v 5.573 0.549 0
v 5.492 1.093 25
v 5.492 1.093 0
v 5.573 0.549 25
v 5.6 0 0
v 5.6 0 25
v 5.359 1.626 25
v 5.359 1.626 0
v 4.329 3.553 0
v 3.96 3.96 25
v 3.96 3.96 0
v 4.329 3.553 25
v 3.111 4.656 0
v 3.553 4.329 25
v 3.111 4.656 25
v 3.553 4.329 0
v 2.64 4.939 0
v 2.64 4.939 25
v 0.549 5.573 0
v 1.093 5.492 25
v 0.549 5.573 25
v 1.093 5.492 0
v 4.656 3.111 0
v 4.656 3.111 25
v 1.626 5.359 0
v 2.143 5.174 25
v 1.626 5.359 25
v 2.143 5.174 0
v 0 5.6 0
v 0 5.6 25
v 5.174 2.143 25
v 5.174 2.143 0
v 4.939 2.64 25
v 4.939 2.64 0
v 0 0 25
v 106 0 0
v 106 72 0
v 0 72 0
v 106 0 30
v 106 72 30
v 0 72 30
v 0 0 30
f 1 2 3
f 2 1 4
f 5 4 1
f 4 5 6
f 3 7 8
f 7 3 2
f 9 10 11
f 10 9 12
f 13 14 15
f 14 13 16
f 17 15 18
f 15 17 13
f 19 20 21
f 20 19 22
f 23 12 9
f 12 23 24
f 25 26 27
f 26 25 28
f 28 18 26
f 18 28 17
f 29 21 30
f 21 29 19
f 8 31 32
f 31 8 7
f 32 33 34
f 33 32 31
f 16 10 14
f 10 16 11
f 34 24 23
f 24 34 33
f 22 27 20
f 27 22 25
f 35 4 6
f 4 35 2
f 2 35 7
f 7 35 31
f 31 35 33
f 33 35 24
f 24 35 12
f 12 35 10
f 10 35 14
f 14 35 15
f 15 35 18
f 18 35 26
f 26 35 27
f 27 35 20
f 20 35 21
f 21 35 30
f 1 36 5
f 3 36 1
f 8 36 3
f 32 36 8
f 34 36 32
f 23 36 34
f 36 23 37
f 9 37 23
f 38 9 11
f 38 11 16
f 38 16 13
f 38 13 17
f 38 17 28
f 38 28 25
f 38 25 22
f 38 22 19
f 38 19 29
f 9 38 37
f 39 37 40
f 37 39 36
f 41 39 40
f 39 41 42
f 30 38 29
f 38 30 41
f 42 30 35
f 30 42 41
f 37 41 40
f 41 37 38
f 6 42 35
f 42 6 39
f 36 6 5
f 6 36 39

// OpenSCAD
// Bench Rack for 1.5 mL Microcentrifuge Tubes

// --- Dimensions ---
rack_length = 106;      // Total length along X (mm)
rack_width = 72;        // Total width along Y (mm)
rack_height = 30;       // Total height of the block (mm)
hole_diameter = 11.2;   // Diameter of each tube hole (mm)
hole_depth = 25;        // Depth of the holes (mm)
floor_thickness = 5;    // Thickness of the solid floor (mm)

// --- Hole Grid Parameters ---
num_rows_y = 4;         // Number of rows along Y
holes_per_row_x = 6;   // Number of holes along X
spacing_xy = 16;        // Center-to-center spacing in both X and Y (mm)

// --- Calculations for Centering ---
// Total span covered by the grid centers: (N-1) * Spacing
span_x = (holes_per_row_x - 1) * spacing_xy;
span_y = (num_rows_y - 1) * spacing_xy;

// Offset from center to the first hole center
offset_x = span_x / 2;
offset_y = span_y / 2;

// --- Constants ---
$fn = 64; // High resolution for curves

// --- Main Module: The Rack Body ---
module bench_rack() {
    difference() {
        // 1. Solid Outer Block (The main body) - Starts at Z=0, ends at Z=30
        cube([rack_length, rack_width, rack_height]);

        // 2. Cutting the Holes
        for (i = [0 : holes_per_row_x - 1]) { // Loop along X (columns)
            for (j = [0 : num_rows_y - 1]) { // Loop along Y (rows)

                // Calculate center position for this hole
                hole_center_x = -(rack_length / 2) + offset_x + i * spacing_xy;
                hole_center_y = -(rack_width / 2) + offset_y + j * spacing_xy;

                // The tube cavity must be 25mm deep, starting at Z=-floor_thickness (-5mm).
                // It ends at Z = -5 - 25 = -30.
                // We cut cylinders of height 'hole_depth' (25mm).
                // Center Z must be: Start_Z + (Height / 2) = -5 + (25/2) = -5 + 12.5 = 7.5? NO.

                // If the cylinder is centered at Z_c and has height H, it spans [Z_c - H/2, Z_c + H/2].
                // We want: Z_top = -floor_thickness (-5) AND Z_bottom = -floor_thickness - hole_depth (-30).
                // Center Z_c = (Z_top + Z_bottom) / 2 = (-5 + -30) / 2 = -35 / 2 = -17.5

                cylinder(h = hole_depth, r = hole_diameter / 2, center = [hole_center_x, hole_center_y, -(floor_thickness + hole_depth)/2]);
            }
        }
    }
}

bench_rack();
